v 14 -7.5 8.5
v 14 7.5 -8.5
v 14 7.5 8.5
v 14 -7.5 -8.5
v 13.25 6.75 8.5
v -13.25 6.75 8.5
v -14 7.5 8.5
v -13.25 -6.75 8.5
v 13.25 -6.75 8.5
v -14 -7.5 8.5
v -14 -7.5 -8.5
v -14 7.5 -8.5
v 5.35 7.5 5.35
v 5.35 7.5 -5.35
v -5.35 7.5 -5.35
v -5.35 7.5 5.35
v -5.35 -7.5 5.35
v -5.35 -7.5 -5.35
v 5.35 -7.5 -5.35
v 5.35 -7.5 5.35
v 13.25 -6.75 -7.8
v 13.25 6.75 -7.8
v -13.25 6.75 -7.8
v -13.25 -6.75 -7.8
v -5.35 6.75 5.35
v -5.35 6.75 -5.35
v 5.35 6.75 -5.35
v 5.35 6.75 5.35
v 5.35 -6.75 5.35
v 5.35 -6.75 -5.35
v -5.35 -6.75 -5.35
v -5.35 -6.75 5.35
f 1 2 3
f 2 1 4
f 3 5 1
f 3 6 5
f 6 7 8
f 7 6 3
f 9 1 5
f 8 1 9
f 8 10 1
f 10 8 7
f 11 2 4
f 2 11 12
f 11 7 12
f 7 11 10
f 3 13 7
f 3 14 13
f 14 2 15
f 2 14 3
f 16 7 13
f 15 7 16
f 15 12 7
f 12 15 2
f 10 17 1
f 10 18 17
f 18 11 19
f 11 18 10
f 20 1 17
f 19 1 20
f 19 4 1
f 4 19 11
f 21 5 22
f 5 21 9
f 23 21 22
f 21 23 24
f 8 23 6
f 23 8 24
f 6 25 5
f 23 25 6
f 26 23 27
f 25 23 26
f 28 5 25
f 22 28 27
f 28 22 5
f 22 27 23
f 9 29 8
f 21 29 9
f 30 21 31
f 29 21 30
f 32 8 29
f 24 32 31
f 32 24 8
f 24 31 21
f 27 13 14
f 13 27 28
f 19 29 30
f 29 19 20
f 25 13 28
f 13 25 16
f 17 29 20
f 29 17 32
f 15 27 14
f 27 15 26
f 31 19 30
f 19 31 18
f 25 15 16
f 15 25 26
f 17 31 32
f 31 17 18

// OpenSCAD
difference(){
    cube([28,15, 17],center=true);

    translate([0,0,.7])
    cube([26.5,13.5, 17], center=true);
    
    cube([10.7,20,10.7], center=true);
}
